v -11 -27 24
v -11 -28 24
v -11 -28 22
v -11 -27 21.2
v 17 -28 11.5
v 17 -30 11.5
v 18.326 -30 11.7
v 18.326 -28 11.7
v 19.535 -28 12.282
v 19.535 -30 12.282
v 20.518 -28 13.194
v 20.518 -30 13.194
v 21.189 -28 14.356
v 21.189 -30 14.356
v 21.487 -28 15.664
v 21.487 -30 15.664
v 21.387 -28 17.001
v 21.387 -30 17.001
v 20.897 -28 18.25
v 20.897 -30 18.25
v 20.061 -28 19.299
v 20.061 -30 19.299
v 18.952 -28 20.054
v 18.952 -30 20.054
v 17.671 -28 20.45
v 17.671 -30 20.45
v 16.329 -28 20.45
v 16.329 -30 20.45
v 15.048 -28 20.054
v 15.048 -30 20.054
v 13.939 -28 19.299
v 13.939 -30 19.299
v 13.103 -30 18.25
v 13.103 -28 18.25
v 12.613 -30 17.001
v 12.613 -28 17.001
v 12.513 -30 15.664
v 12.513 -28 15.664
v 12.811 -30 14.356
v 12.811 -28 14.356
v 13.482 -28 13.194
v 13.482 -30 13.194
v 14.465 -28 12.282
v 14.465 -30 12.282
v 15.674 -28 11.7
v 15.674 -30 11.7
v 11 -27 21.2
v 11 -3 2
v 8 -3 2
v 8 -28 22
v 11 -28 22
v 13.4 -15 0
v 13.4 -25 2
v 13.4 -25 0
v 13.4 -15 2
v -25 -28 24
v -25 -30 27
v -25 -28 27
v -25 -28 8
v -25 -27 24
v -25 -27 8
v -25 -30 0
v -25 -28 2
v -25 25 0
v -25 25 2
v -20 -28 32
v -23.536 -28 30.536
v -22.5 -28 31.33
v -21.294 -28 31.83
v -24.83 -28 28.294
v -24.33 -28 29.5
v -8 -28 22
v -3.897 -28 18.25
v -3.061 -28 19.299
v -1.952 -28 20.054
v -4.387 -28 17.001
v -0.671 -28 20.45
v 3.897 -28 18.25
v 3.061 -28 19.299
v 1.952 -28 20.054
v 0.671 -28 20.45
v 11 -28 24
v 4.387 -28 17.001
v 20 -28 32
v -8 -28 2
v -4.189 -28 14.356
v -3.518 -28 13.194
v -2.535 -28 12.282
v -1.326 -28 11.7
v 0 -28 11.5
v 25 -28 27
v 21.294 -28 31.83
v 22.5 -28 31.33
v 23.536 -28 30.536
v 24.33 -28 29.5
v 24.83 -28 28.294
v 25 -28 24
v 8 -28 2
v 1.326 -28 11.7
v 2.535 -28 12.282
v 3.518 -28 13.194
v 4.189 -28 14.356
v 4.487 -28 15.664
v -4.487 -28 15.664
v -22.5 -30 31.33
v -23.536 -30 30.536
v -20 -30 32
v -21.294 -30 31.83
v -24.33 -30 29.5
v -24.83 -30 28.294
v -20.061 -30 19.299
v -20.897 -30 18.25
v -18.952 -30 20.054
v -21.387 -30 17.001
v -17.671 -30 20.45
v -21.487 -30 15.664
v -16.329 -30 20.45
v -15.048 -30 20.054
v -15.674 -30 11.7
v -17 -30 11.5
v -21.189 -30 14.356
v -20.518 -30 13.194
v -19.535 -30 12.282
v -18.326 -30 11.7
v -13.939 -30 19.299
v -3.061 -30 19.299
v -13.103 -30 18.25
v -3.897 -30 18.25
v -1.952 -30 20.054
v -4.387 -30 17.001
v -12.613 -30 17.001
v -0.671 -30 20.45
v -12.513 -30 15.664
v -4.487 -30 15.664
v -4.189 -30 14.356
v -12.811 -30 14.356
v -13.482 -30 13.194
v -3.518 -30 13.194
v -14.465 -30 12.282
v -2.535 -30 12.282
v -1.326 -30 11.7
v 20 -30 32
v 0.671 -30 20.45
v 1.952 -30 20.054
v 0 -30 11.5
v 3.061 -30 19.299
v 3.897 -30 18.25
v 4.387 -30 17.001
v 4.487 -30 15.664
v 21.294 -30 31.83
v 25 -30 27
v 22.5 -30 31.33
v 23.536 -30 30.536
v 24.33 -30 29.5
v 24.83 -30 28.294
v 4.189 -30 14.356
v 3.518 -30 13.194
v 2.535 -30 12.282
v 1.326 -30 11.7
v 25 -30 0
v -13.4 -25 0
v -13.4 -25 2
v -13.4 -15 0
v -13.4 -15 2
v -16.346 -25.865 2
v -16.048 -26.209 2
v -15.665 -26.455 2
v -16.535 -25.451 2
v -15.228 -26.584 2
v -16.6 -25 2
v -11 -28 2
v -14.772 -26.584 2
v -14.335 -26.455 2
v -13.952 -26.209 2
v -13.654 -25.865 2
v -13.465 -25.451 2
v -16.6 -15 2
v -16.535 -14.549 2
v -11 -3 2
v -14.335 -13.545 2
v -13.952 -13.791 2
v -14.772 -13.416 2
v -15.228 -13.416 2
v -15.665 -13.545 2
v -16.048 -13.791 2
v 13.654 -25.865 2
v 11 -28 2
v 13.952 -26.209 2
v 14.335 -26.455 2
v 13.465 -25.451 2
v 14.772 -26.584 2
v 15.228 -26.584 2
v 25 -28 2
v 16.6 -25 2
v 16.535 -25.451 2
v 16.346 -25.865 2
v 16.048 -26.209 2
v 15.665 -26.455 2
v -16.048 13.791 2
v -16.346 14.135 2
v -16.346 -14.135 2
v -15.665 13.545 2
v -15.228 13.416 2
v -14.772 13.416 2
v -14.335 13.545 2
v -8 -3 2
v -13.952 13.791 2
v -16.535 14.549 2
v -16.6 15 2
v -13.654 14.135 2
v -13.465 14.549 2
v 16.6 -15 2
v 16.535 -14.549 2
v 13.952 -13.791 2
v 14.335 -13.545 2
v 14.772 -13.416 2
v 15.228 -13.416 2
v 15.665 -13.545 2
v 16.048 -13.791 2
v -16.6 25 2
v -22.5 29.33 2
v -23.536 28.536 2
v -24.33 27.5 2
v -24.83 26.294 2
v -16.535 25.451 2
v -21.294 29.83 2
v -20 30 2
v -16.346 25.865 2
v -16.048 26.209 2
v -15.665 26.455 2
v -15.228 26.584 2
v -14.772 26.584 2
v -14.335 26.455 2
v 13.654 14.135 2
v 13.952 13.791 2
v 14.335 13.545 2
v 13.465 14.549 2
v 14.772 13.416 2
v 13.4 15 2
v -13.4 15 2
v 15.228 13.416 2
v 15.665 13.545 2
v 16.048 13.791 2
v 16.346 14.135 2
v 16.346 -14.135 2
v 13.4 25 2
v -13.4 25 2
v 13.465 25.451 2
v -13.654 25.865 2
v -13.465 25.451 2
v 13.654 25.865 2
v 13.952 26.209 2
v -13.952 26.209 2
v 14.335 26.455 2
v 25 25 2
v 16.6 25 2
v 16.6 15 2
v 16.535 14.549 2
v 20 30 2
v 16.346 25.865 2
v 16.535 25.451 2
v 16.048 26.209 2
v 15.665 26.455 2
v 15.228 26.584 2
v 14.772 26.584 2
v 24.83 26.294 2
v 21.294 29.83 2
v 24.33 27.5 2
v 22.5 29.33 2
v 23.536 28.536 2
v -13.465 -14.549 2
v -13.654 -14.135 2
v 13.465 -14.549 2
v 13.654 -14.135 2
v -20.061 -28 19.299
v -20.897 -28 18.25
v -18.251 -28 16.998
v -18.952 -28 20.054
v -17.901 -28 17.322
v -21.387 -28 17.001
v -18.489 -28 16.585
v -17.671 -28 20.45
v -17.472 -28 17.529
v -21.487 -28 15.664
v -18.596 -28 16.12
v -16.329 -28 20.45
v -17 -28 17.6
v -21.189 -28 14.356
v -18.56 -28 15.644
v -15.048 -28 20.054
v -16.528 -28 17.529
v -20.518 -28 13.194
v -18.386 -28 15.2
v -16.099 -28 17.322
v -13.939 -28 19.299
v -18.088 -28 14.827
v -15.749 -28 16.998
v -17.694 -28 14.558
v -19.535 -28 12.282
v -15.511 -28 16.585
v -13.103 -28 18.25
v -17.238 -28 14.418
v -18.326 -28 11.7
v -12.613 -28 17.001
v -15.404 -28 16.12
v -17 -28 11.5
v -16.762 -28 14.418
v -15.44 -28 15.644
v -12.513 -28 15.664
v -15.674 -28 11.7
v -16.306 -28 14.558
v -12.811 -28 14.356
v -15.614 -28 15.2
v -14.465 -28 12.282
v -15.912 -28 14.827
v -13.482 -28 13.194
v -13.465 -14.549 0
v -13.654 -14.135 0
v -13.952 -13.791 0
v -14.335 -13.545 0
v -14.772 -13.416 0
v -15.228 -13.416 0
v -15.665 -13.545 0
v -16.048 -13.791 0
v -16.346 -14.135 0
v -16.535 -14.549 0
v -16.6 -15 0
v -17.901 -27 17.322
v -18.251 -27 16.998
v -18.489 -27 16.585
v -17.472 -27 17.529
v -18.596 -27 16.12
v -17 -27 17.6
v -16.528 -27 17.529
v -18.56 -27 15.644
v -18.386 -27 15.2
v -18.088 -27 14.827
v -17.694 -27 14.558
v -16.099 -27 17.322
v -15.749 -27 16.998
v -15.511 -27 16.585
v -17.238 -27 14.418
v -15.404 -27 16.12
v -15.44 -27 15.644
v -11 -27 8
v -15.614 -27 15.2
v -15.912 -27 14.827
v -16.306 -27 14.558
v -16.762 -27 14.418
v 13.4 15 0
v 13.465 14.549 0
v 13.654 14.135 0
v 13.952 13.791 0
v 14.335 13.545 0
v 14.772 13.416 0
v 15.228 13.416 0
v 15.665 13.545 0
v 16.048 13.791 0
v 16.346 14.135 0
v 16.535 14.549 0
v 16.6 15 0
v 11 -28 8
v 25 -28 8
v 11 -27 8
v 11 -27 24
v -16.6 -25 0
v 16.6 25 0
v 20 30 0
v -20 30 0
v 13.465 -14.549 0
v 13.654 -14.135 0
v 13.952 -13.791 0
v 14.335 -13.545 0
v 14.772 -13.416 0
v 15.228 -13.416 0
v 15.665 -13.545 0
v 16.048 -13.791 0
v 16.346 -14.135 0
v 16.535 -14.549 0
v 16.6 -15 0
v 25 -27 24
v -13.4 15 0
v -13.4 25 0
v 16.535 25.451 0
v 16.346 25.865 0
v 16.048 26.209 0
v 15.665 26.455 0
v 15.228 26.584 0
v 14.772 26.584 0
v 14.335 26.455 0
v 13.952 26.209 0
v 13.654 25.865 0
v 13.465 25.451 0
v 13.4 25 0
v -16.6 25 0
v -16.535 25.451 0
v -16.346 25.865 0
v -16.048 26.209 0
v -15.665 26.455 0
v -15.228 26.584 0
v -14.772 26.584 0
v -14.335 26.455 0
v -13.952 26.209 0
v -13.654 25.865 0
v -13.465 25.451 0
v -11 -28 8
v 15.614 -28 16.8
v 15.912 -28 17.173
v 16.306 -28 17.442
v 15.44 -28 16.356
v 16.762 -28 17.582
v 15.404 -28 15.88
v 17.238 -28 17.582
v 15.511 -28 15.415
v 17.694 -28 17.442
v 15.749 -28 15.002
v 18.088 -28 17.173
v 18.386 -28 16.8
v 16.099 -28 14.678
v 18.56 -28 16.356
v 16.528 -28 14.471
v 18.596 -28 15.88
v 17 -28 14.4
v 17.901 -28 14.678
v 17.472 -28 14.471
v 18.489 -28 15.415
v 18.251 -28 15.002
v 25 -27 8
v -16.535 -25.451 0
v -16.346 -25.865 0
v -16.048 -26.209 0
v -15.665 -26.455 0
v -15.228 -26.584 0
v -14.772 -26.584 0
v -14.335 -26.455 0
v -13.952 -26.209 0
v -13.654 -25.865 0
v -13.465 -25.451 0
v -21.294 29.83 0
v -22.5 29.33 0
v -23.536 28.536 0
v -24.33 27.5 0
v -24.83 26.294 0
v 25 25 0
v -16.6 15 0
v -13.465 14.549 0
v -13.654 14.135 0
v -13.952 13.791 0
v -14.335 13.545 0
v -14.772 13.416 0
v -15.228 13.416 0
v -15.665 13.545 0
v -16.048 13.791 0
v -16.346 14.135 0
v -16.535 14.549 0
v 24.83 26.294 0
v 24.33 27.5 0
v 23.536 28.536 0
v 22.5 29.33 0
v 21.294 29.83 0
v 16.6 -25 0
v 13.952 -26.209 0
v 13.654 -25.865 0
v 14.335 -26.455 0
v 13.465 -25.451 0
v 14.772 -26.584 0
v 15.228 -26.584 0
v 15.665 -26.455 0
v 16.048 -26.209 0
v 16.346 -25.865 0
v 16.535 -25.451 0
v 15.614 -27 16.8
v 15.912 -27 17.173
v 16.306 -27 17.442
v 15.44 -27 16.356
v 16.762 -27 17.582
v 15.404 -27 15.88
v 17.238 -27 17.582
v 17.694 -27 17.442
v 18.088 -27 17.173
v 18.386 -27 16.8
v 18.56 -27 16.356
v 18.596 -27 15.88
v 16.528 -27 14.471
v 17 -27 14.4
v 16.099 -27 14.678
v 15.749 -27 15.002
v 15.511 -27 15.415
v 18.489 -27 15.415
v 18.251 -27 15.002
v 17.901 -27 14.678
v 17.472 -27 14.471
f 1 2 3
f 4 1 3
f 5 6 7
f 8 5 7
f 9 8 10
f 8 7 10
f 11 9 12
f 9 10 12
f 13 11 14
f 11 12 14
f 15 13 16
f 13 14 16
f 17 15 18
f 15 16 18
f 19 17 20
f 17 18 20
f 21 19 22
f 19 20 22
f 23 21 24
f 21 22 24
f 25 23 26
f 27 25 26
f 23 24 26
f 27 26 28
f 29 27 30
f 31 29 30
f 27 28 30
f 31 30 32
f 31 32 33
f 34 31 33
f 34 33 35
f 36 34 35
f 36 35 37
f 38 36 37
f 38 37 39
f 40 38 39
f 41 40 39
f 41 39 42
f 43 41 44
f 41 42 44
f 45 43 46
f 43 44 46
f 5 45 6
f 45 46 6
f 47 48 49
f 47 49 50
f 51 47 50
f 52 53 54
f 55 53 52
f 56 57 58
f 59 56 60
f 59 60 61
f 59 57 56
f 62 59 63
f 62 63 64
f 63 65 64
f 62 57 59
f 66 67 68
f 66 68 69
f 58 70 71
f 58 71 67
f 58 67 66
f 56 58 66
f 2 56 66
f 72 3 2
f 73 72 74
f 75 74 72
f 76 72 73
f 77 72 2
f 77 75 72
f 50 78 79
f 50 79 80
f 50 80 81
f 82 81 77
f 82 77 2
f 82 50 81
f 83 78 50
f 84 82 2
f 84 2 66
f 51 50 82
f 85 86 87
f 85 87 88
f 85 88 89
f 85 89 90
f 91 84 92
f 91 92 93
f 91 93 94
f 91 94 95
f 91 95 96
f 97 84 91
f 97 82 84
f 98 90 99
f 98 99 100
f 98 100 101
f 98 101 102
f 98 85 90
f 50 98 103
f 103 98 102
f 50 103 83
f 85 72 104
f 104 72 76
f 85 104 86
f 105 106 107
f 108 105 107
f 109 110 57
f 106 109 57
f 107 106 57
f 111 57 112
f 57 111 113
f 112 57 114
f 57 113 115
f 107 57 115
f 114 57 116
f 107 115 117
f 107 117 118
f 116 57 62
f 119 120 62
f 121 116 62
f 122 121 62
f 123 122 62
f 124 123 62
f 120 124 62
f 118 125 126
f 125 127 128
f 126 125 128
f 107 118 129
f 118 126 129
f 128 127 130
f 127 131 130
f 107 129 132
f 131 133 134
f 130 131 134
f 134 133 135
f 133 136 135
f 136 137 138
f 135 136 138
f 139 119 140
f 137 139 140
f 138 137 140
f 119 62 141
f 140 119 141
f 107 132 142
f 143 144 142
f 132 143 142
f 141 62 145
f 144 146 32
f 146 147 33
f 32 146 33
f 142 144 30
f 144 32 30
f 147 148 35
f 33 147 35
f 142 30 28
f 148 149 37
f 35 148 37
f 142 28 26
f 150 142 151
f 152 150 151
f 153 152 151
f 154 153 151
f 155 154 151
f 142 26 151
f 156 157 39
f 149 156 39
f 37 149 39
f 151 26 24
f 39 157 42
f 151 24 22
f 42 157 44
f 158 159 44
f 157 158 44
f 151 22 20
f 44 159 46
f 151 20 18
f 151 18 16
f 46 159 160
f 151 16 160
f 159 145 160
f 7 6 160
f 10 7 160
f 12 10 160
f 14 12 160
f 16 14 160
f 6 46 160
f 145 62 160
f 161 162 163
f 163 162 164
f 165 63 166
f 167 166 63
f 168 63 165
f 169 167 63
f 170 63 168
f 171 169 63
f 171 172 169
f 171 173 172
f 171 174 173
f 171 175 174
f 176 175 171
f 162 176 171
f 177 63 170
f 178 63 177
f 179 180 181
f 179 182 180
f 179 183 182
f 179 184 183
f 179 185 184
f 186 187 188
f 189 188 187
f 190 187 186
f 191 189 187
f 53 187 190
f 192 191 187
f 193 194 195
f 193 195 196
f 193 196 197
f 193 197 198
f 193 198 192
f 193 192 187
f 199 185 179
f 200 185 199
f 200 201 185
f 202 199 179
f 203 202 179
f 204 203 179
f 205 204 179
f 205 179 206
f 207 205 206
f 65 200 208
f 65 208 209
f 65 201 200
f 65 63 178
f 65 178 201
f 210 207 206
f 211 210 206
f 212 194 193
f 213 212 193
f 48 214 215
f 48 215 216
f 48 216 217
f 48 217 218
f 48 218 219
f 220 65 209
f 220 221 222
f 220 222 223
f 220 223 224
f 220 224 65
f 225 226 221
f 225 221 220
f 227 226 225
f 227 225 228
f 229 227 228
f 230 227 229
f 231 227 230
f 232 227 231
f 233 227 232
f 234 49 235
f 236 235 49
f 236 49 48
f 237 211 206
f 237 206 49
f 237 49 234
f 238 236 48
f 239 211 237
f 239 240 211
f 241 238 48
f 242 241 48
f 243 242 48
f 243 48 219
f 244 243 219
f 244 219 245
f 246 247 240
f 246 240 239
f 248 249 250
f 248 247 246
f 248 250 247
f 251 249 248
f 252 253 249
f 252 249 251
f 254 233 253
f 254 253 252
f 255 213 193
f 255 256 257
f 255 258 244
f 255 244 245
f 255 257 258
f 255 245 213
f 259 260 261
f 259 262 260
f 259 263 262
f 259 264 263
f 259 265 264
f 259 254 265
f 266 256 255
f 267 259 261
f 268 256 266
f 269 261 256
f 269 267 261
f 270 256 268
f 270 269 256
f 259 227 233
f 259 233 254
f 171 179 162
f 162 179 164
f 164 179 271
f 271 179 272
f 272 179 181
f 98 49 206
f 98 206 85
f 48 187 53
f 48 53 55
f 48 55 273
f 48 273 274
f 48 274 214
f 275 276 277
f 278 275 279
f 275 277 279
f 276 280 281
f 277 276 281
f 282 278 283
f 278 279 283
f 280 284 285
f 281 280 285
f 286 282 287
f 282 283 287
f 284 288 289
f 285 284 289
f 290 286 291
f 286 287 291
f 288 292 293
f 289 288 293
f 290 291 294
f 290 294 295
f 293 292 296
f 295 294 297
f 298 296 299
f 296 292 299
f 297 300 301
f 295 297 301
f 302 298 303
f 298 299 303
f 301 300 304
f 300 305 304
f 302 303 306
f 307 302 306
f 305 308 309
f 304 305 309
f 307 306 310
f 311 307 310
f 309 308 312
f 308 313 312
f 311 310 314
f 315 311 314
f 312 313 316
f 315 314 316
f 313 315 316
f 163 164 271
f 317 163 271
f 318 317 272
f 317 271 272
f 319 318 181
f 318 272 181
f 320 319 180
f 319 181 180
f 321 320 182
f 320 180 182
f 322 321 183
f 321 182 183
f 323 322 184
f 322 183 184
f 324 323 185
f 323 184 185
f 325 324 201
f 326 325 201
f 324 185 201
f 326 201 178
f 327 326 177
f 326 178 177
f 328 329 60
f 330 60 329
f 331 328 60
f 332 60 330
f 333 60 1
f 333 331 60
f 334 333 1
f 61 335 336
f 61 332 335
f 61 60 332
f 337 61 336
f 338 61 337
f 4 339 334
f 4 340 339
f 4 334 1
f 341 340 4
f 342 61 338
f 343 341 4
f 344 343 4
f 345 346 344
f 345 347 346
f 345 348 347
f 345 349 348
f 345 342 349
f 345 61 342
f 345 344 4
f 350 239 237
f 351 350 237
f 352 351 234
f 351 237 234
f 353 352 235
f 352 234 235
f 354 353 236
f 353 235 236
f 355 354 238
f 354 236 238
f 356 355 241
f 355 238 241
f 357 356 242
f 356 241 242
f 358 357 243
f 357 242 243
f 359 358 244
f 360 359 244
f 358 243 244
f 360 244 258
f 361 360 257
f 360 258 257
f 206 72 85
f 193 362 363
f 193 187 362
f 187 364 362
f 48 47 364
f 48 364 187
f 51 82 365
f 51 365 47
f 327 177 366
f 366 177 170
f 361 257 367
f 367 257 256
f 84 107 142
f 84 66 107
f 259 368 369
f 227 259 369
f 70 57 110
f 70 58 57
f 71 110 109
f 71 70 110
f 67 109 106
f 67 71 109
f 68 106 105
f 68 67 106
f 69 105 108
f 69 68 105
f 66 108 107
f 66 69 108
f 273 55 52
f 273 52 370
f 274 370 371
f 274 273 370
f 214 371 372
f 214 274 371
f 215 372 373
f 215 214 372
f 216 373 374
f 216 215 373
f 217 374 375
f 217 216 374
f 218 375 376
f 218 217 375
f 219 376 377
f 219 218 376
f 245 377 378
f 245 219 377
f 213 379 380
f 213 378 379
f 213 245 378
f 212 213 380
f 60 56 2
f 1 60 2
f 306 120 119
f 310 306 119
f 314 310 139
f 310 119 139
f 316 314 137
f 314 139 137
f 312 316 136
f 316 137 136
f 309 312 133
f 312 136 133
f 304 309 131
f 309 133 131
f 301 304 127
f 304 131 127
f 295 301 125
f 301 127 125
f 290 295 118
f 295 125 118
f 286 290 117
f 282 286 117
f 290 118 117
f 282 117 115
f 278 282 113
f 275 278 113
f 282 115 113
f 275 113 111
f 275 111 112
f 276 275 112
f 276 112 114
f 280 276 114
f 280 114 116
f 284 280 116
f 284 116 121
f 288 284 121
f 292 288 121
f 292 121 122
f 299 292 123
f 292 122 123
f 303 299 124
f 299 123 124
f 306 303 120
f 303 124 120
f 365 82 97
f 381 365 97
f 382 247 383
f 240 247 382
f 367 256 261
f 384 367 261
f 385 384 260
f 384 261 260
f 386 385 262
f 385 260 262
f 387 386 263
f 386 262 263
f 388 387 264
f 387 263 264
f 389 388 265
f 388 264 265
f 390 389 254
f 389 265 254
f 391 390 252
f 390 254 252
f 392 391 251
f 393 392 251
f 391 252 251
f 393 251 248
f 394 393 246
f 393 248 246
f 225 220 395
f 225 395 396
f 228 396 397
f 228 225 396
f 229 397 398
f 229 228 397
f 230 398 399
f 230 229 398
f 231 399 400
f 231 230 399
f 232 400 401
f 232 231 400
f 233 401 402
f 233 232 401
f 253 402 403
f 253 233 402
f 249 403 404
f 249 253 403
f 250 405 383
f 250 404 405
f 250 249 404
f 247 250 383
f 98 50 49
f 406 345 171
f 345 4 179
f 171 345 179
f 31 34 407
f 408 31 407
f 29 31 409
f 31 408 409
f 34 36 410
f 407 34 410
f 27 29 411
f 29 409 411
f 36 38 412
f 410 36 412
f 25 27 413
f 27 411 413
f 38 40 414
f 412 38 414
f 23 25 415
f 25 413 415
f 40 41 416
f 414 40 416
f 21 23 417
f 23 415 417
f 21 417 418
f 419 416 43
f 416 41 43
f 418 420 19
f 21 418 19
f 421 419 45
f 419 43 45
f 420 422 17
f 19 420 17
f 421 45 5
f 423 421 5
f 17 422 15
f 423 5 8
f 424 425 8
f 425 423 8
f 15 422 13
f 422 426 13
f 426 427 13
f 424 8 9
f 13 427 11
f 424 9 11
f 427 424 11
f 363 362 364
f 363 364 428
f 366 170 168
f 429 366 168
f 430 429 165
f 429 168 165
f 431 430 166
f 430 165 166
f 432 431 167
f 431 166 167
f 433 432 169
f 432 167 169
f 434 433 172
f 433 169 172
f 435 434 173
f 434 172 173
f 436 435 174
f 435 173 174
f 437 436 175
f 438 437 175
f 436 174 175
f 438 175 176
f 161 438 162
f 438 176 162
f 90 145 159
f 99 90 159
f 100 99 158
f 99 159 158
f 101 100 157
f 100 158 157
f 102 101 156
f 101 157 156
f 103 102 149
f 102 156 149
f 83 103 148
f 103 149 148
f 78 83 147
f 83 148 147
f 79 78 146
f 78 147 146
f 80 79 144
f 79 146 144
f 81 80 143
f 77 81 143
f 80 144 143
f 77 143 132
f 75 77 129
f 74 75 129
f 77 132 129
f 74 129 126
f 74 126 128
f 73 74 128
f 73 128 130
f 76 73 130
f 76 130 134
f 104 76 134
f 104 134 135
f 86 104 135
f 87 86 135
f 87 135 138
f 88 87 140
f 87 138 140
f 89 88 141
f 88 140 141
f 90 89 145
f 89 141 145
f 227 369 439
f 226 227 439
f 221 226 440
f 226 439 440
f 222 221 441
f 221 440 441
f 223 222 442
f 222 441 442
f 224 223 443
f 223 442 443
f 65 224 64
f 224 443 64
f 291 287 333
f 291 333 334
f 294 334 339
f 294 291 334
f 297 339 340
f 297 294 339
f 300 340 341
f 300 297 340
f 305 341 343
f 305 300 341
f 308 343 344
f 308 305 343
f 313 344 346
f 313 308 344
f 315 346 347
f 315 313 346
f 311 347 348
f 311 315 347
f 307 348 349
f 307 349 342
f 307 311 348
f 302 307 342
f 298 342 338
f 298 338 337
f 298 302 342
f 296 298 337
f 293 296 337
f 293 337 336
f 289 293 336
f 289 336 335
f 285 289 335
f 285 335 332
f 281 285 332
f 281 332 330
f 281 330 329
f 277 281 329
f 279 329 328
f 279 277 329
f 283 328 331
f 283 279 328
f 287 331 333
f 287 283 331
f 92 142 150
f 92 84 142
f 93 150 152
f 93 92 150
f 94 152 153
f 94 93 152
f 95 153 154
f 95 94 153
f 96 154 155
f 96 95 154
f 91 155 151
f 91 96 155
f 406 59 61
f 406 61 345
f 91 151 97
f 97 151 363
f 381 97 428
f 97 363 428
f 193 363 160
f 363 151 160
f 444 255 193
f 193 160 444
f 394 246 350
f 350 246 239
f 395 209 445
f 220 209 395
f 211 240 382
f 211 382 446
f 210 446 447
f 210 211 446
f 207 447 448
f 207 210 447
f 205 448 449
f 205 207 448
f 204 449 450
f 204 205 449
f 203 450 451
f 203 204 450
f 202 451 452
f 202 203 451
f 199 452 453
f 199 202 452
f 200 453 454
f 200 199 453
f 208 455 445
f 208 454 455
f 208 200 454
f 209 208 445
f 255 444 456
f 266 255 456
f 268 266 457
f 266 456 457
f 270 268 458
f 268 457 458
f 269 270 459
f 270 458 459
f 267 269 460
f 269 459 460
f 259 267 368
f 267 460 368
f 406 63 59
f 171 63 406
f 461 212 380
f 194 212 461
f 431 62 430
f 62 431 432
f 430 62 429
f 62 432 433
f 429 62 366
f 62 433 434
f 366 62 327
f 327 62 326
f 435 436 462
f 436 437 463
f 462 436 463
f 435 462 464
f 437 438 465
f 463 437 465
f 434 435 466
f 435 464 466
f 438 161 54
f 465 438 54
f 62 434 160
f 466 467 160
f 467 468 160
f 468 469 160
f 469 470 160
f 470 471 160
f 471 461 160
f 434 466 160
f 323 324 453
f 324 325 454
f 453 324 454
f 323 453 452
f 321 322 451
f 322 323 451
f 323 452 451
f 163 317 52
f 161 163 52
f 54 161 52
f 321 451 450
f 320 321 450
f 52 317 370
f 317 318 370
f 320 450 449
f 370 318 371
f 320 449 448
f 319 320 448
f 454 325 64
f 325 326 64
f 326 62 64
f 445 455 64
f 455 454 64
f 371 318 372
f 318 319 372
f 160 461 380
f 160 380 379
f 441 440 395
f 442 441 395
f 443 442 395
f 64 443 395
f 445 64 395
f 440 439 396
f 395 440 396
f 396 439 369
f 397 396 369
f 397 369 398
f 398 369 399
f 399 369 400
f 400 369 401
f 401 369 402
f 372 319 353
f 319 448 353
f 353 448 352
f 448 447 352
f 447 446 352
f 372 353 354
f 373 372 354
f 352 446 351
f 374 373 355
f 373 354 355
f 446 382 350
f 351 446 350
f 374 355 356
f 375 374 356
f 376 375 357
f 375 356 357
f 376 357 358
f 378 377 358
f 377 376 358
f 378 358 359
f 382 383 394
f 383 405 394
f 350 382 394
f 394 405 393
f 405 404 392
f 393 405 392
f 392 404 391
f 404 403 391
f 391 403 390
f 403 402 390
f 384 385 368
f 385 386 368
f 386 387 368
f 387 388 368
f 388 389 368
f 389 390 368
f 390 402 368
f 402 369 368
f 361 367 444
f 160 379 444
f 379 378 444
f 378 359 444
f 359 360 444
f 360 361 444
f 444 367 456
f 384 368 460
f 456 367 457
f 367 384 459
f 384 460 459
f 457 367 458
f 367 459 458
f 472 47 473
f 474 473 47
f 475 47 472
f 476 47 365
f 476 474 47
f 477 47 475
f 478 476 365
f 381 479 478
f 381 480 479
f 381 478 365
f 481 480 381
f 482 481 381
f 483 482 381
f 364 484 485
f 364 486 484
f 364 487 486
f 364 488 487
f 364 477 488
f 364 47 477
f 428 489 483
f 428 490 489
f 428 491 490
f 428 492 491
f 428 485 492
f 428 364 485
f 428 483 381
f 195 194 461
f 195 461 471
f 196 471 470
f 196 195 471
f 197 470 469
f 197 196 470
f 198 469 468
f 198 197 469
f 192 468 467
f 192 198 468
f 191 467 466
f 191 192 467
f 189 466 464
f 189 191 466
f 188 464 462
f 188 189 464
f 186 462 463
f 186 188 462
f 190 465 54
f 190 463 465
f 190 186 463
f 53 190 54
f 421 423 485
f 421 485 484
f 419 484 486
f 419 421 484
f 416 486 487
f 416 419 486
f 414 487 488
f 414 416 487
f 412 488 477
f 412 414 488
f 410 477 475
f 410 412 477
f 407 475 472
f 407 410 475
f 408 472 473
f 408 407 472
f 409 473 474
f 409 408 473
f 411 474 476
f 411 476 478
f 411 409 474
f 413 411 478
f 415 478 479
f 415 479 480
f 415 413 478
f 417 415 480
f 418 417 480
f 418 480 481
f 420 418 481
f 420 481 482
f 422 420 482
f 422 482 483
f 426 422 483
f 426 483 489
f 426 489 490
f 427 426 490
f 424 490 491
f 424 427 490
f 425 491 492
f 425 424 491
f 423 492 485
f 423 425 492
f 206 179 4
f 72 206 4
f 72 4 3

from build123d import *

# Parameters (mm, degrees)
DODANIE_WYCI_GNI_CIE1_DEPTH = 2
WYTNIJ_WYCI_GNI_CIE1_REACH  = 41.102
SZKIC4_W                    = 50
SZKIC4_H                    = 2
DODANIE_WYCI_GNI_CIE2_DEPTH = 30
DODANIE_WYCI_GNI_CIE3_START = -14
DODANIE_WYCI_GNI_CIE3_DEPTH = 3
ZAOKR_GLENIE1_R             = 5
SZKIC7_R                    = 4.5
WYTNIJ_WYCI_GNI_CIE2_DEPTH  = 2
SZKIC8_W                    = 14
SZKIC8_H                    = 16
SZKIC8_R                    = 1.6
DODANIE_WYCI_GNI_CIE4_DEPTH = 1


with BuildPart() as part:
    # Szkic1 → Dodanie-wyciągnięcie1 (new body)
    with BuildSketch(Plane.XY):
        with BuildLine():
            Line((-25, -30), (25, -30))
            Line((25, -30), (25, 25))
            ThreePointArc((25, 25), (23.535533906, 28.535533906), (20, 30))
            Line((20, 30), (-20, 30))
            ThreePointArc((-20, 30), (-23.535533906, 28.535533906), (-25, 25))
            Line((-25, 25), (-25, -30))
        make_face()
    extrude(amount=DODANIE_WYCI_GNI_CIE1_DEPTH)

    # Szkic2 → Wytnij-wyciągnięcie1 (cut, up to next)
    with BuildSketch(Plane.XY.offset(2), mode=Mode.PRIVATE) as wytnij_wyci_gni_cie1_sk1:
        with BuildLine():
            Line((-13.4, 25), (-13.4, 15))
            ThreePointArc((-13.4, 15), (-15, 13.4), (-16.6, 15))
            Line((-16.6, 15), (-16.6, 25))
            ThreePointArc((-16.6, 25), (-15, 26.6), (-13.4, 25))
        make_face()
    wytnij_wyci_gni_cie1_tool1 = extrude(wytnij_wyci_gni_cie1_sk1.sketch, amount=-WYTNIJ_WYCI_GNI_CIE1_REACH, mode=Mode.PRIVATE) & part.part
    # Szkic2 → Wytnij-wyciągnięcie1 (cut, up to next)
    with BuildSketch(Plane.XY.offset(2), mode=Mode.PRIVATE) as wytnij_wyci_gni_cie1_sk2:
        with BuildLine():
            Line((13.4, 25), (13.4, 15))
            ThreePointArc((13.4, 15), (15, 13.4), (16.6, 15))
            Line((16.6, 15), (16.6, 25))
            ThreePointArc((16.6, 25), (15, 26.6), (13.4, 25))
        make_face()
    wytnij_wyci_gni_cie1_tool2 = extrude(wytnij_wyci_gni_cie1_sk2.sketch, amount=-WYTNIJ_WYCI_GNI_CIE1_REACH, mode=Mode.PRIVATE) & part.part
    # Szkic2 → Wytnij-wyciągnięcie1 (cut, up to next)
    with BuildSketch(Plane.XY.offset(2), mode=Mode.PRIVATE) as wytnij_wyci_gni_cie1_sk3:
        with BuildLine():
            Line((13.4, -25), (13.4, -15))
            ThreePointArc((13.4, -15), (15, -13.4), (16.6, -15))
            Line((16.6, -15), (16.6, -25))
            ThreePointArc((16.6, -25), (15, -26.6), (13.4, -25))
        make_face()
    wytnij_wyci_gni_cie1_tool3 = extrude(wytnij_wyci_gni_cie1_sk3.sketch, amount=-WYTNIJ_WYCI_GNI_CIE1_REACH, mode=Mode.PRIVATE) & part.part
    # Szkic2 → Wytnij-wyciągnięcie1 (cut, up to next)
    with BuildSketch(Plane.XY.offset(2), mode=Mode.PRIVATE) as wytnij_wyci_gni_cie1_sk4:
        with BuildLine():
            Line((-13.4, -25), (-13.4, -15))
            ThreePointArc((-13.4, -15), (-15, -13.4), (-16.6, -15))
            Line((-16.6, -15), (-16.6, -25))
            ThreePointArc((-16.6, -25), (-15, -26.6), (-13.4, -25))
        make_face()
    wytnij_wyci_gni_cie1_tool4 = extrude(wytnij_wyci_gni_cie1_sk4.sketch, amount=-WYTNIJ_WYCI_GNI_CIE1_REACH, mode=Mode.PRIVATE) & part.part
    add(wytnij_wyci_gni_cie1_tool1.solids().sort_by_distance((-15, 20, 2))[0], mode=Mode.SUBTRACT)
    add(wytnij_wyci_gni_cie1_tool2.solids().sort_by_distance((15, 20, 2))[0], mode=Mode.SUBTRACT)
    add(wytnij_wyci_gni_cie1_tool3.solids().sort_by_distance((15, -20, 2))[0], mode=Mode.SUBTRACT)
    add(wytnij_wyci_gni_cie1_tool4.solids().sort_by_distance((-15, -20, 2))[0], mode=Mode.SUBTRACT)

    # Szkic4 → Dodanie-wyciągnięcie2 (add)
    with BuildSketch(Plane.XY.offset(2)):
        with Locations((0, -29)):
            Rectangle(SZKIC4_W, SZKIC4_H)
    extrude(amount=DODANIE_WYCI_GNI_CIE2_DEPTH)


with BuildPart() as body_2:
    # Szkic6 → Dodanie-wyciągnięcie3 (new body)
    with BuildSketch(Plane.ZY.offset(25).offset(DODANIE_WYCI_GNI_CIE3_START)):
        Polygon((2, -28), (2, -3), (22, -28), align=None)
    dodanie_wyci_gni_cie3 = extrude(amount=-DODANIE_WYCI_GNI_CIE3_DEPTH)


with BuildPart() as part_1:
    add(part.part)

    # Lustro3: Dodanie-wyciągnięcie3 across plane
    add(dodanie_wyci_gni_cie3.mirror(Plane(origin=(0, 0, 0), x_dir=(0, 0, 1), z_dir=(1, 0, 0))))

    # Zaokrąglenie1
    zaokr_glenie1_edges = [part_1.edges().sort_by_distance(p)[0] for p in [
        (-25, -29, 32),
        (25, -29, 32),
    ]]
    fillet(zaokr_glenie1_edges, radius=ZAOKR_GLENIE1_R)

    # Szkic7 → Wytnij-wyciągnięcie2 (cut)
    with BuildSketch(Plane.XZ.offset(30)):
        with Locations(Location((0, 16, 0), (0, 0, 270))):
            Circle(SZKIC7_R)
        with Locations(Location((-17, 16, 0), (0, 0, 270))):
            Circle(SZKIC7_R)
        with Locations(Location((17, 16, 0), (0, 0, 270))):
            Circle(SZKIC7_R)
    extrude(amount=-WYTNIJ_WYCI_GNI_CIE2_DEPTH, mode=Mode.SUBTRACT)

    add(body_2.part)  # Dodanie-wyciągnięcie4 merges body 2
    # Szkic8 → Dodanie-wyciągnięcie4 (add)
    # profile 1 of 2: a face of its own
    with BuildSketch(Plane(origin=(0, -28, 0), x_dir=(1, 0, 0), z_dir=(0, 1, 0))):
        with Locations((-18, -16)):
            Rectangle(SZKIC8_W, SZKIC8_H)
        with Locations(Location((-17, -16, 0), (0, 0, 270))):
            Circle(SZKIC8_R, mode=Mode.SUBTRACT)
    # profile 2 of 2: a face of its own
    with BuildSketch(Plane(origin=(0, -28, 0), x_dir=(1, 0, 0), z_dir=(0, 1, 0))):
        with Locations((18, -16)):
            Rectangle(SZKIC8_W, SZKIC8_H)
        with Locations(Location((17, -16, 0), (0, 0, 90))):
            Circle(SZKIC8_R, mode=Mode.SUBTRACT)
    extrude(amount=DODANIE_WYCI_GNI_CIE4_DEPTH)


solid = part_1.part
